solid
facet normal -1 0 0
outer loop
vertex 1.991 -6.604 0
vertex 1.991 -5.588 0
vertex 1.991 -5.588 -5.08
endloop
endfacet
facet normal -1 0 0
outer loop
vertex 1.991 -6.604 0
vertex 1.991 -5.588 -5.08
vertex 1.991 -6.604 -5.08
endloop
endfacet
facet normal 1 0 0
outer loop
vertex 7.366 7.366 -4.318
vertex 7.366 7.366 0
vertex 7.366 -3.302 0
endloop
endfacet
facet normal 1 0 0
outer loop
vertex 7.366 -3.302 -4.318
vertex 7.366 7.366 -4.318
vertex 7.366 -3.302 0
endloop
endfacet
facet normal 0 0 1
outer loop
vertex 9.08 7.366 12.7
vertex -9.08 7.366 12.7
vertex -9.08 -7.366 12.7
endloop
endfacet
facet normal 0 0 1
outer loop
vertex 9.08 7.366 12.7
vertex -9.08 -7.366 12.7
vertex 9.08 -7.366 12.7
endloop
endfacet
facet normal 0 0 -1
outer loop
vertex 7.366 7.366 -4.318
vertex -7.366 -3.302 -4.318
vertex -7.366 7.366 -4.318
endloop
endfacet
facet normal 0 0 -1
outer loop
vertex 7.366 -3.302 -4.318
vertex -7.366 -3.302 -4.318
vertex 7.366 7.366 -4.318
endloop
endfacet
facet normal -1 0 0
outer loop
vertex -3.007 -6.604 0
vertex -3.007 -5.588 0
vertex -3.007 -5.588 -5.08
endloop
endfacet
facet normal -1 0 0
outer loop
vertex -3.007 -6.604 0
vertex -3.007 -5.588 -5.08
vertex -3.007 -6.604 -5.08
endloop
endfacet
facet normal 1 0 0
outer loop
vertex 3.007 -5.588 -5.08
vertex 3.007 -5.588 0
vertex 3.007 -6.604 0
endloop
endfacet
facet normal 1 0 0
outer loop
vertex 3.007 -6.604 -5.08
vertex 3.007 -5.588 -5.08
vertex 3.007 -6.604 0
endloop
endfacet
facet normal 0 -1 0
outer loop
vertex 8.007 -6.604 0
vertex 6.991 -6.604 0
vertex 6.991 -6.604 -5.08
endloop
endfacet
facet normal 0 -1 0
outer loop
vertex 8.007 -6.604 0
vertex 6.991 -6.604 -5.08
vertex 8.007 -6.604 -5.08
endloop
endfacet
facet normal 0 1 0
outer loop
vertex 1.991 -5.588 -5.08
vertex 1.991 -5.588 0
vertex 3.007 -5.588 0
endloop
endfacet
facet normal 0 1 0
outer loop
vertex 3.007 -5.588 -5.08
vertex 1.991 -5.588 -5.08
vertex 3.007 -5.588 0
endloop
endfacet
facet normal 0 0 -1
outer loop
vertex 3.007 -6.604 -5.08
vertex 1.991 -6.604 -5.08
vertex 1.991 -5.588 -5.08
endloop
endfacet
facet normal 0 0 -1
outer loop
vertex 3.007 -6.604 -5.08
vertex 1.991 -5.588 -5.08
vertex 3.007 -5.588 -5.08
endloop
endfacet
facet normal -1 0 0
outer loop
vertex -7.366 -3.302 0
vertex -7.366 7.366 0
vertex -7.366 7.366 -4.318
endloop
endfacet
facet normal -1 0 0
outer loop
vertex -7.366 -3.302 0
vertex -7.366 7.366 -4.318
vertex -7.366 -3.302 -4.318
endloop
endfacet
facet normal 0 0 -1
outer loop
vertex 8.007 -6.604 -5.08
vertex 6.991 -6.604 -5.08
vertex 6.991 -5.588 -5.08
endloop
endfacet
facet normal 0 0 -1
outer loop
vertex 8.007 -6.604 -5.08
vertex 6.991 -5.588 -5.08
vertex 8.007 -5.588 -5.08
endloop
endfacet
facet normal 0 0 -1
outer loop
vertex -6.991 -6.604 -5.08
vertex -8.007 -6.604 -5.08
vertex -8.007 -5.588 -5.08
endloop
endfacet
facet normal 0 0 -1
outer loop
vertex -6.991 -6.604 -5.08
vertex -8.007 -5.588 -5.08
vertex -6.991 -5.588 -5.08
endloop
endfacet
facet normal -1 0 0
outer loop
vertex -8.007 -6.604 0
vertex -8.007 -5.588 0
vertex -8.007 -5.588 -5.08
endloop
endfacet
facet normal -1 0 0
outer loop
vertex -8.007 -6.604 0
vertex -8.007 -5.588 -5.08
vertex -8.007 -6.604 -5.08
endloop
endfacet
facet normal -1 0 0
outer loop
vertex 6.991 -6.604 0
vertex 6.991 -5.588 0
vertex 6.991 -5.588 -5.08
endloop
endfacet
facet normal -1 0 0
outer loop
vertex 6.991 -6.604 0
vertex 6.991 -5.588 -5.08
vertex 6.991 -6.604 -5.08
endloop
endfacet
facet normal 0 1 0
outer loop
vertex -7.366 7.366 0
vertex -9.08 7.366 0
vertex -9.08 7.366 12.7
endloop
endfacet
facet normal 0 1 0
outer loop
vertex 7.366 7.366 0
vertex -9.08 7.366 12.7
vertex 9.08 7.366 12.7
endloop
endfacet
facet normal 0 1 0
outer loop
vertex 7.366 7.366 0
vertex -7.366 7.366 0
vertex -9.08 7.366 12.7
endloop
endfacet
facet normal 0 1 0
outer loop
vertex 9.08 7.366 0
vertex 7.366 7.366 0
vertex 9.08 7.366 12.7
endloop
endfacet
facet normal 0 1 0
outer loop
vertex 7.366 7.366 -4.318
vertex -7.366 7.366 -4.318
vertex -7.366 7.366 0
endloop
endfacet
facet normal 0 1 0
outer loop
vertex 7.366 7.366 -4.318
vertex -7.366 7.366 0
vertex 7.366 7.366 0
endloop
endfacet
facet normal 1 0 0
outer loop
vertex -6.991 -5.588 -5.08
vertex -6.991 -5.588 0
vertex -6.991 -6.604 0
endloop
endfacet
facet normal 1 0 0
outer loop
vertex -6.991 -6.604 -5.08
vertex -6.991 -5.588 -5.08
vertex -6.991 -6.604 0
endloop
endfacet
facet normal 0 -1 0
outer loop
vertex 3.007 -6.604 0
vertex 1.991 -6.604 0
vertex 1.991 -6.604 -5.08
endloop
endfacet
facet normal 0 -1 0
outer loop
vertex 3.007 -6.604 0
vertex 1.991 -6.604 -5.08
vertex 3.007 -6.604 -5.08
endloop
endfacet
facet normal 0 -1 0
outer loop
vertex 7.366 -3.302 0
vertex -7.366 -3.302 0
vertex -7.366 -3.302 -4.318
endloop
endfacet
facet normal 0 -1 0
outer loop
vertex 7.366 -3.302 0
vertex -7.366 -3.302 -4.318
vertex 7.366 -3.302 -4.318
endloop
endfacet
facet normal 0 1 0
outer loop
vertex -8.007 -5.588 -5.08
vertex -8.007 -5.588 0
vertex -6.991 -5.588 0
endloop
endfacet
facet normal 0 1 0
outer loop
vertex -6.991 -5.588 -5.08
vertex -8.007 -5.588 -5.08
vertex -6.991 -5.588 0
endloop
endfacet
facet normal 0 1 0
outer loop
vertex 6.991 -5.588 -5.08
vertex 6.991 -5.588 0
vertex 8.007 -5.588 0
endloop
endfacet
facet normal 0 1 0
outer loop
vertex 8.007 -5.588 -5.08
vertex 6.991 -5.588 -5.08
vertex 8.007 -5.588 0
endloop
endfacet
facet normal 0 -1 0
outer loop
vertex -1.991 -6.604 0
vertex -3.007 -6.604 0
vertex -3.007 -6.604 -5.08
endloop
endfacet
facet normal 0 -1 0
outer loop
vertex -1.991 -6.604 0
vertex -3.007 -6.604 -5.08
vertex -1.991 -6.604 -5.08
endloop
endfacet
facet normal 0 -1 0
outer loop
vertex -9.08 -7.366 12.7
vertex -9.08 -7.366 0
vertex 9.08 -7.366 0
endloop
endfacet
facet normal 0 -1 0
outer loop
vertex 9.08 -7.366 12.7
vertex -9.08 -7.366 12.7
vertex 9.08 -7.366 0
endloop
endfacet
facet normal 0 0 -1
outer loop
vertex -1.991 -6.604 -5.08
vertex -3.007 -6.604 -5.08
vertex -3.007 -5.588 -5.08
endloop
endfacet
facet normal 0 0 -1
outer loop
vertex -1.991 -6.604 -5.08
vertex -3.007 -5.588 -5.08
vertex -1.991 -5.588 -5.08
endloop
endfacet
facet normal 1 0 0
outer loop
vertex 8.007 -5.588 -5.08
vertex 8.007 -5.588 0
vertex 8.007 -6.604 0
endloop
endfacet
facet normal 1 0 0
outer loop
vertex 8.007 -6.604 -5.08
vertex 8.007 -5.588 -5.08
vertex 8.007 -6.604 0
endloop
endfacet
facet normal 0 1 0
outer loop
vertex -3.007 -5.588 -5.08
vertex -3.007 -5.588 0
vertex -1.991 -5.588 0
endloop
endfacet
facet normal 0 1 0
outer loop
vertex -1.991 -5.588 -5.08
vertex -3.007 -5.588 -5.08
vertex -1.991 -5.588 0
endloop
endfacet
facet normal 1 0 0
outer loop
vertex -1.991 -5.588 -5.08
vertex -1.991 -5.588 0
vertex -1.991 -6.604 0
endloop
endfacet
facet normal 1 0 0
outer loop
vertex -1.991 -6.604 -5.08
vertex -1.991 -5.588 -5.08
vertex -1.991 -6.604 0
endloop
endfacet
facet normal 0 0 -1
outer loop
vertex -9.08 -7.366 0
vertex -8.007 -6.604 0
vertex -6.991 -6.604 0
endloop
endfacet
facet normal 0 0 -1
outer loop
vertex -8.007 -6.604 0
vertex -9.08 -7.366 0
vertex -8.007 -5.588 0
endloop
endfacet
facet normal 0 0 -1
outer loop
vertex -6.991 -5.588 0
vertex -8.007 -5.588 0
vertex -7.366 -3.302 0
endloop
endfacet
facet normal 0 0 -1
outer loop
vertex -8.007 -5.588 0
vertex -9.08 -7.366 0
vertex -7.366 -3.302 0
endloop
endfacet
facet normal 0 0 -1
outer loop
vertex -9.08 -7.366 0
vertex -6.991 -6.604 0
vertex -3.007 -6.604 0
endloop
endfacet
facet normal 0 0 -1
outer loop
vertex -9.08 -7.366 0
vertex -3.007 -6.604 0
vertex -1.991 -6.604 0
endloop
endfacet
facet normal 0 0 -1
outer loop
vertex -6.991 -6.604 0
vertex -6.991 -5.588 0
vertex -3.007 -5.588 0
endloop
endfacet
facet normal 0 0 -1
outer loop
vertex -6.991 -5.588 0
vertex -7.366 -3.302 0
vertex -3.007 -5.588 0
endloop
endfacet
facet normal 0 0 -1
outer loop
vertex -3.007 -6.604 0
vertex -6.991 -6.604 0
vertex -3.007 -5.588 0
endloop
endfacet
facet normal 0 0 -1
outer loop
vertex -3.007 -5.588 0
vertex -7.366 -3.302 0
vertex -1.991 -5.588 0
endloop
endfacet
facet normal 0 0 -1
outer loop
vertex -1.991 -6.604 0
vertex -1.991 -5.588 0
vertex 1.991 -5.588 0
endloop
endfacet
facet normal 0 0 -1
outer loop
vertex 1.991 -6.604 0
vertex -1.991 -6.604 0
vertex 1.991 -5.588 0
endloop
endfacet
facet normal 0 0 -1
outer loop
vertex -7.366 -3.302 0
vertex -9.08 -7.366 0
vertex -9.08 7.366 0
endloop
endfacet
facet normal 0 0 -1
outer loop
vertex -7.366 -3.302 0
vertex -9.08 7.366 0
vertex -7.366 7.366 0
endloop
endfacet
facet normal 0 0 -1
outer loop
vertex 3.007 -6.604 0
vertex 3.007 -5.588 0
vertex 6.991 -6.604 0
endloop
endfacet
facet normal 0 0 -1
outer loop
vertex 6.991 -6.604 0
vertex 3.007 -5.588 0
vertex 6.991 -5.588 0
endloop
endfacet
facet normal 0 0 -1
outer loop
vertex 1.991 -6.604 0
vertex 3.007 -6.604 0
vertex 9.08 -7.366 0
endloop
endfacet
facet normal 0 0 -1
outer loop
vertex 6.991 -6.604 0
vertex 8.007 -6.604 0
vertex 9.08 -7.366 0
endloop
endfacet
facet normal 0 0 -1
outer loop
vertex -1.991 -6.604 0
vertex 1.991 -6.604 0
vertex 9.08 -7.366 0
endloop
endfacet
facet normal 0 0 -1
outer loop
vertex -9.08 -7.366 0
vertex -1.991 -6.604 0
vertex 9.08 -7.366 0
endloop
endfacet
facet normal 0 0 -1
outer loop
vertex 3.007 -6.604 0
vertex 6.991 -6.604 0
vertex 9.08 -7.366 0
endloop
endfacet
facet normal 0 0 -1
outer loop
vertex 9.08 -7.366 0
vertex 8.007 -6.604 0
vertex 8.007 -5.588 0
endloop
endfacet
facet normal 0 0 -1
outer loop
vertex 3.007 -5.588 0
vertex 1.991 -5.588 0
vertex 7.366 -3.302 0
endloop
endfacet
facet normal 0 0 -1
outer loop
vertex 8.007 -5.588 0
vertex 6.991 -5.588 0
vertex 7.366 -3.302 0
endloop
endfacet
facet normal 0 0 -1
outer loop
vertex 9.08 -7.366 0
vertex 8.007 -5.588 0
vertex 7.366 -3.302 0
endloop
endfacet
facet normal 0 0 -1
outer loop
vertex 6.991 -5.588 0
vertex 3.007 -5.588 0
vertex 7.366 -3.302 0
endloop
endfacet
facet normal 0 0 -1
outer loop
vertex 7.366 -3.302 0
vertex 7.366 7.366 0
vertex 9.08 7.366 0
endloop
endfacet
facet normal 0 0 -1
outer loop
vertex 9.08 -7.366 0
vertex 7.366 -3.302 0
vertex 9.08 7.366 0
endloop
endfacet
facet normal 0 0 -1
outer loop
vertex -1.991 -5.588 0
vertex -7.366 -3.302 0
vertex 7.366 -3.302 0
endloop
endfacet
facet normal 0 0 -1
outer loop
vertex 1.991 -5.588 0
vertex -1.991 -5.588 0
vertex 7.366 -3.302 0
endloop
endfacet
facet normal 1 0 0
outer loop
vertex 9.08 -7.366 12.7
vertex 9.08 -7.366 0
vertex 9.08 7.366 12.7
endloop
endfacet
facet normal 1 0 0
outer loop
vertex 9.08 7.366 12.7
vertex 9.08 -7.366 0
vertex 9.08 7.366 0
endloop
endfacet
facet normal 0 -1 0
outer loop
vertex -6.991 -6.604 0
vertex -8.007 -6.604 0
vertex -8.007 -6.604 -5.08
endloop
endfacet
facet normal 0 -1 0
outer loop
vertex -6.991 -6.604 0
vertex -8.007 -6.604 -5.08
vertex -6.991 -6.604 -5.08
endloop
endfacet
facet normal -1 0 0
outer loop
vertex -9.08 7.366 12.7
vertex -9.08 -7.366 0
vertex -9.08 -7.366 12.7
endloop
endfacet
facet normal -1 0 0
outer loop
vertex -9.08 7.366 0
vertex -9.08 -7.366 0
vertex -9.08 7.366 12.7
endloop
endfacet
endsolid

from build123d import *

# Parameters (mm, degrees)
F0_W     = 18.161
F0_H     = 14.732
F1_DEPTH = 12.7
F2_W     = 14.732
F2_H     = 10.668
F3_DEPTH = 4.318
F4_W     = 1.016
F4_H     = 1.016
F5_DEPTH = 5.08


with BuildPart() as f1:
    # F0 (on Top) → F1 (new body)
    with BuildSketch(Plane.XY):
        Rectangle(F0_W, F0_H)
    extrude(amount=F1_DEPTH)

    # F2 (on face) → F3 (join)
    with BuildSketch(Plane(origin=(0, 0, 0), x_dir=(1, 0, 0), z_dir=(0, 0, -1))):
        with Locations((0, -2.032)):
            Rectangle(F2_W, F2_H)
    extrude(amount=F3_DEPTH)

    # F4 (on face) → F5 (join)
    with BuildSketch(Plane(origin=(0, 0, 0), x_dir=(1, 0, 0), z_dir=(0, 0, -1))):
        with Locations((-7.49935, 6.096)):
            Rectangle(F4_W, F4_H)
        with Locations((-2.49936, 6.096)):
            Rectangle(F4_W, F4_H)
        with Locations((2.49936, 6.096)):
            Rectangle(F4_W, F4_H)
        with Locations((7.49935, 6.096)):
            Rectangle(F4_W, F4_H)
    extrude(amount=F5_DEPTH)


solid = f1.part
